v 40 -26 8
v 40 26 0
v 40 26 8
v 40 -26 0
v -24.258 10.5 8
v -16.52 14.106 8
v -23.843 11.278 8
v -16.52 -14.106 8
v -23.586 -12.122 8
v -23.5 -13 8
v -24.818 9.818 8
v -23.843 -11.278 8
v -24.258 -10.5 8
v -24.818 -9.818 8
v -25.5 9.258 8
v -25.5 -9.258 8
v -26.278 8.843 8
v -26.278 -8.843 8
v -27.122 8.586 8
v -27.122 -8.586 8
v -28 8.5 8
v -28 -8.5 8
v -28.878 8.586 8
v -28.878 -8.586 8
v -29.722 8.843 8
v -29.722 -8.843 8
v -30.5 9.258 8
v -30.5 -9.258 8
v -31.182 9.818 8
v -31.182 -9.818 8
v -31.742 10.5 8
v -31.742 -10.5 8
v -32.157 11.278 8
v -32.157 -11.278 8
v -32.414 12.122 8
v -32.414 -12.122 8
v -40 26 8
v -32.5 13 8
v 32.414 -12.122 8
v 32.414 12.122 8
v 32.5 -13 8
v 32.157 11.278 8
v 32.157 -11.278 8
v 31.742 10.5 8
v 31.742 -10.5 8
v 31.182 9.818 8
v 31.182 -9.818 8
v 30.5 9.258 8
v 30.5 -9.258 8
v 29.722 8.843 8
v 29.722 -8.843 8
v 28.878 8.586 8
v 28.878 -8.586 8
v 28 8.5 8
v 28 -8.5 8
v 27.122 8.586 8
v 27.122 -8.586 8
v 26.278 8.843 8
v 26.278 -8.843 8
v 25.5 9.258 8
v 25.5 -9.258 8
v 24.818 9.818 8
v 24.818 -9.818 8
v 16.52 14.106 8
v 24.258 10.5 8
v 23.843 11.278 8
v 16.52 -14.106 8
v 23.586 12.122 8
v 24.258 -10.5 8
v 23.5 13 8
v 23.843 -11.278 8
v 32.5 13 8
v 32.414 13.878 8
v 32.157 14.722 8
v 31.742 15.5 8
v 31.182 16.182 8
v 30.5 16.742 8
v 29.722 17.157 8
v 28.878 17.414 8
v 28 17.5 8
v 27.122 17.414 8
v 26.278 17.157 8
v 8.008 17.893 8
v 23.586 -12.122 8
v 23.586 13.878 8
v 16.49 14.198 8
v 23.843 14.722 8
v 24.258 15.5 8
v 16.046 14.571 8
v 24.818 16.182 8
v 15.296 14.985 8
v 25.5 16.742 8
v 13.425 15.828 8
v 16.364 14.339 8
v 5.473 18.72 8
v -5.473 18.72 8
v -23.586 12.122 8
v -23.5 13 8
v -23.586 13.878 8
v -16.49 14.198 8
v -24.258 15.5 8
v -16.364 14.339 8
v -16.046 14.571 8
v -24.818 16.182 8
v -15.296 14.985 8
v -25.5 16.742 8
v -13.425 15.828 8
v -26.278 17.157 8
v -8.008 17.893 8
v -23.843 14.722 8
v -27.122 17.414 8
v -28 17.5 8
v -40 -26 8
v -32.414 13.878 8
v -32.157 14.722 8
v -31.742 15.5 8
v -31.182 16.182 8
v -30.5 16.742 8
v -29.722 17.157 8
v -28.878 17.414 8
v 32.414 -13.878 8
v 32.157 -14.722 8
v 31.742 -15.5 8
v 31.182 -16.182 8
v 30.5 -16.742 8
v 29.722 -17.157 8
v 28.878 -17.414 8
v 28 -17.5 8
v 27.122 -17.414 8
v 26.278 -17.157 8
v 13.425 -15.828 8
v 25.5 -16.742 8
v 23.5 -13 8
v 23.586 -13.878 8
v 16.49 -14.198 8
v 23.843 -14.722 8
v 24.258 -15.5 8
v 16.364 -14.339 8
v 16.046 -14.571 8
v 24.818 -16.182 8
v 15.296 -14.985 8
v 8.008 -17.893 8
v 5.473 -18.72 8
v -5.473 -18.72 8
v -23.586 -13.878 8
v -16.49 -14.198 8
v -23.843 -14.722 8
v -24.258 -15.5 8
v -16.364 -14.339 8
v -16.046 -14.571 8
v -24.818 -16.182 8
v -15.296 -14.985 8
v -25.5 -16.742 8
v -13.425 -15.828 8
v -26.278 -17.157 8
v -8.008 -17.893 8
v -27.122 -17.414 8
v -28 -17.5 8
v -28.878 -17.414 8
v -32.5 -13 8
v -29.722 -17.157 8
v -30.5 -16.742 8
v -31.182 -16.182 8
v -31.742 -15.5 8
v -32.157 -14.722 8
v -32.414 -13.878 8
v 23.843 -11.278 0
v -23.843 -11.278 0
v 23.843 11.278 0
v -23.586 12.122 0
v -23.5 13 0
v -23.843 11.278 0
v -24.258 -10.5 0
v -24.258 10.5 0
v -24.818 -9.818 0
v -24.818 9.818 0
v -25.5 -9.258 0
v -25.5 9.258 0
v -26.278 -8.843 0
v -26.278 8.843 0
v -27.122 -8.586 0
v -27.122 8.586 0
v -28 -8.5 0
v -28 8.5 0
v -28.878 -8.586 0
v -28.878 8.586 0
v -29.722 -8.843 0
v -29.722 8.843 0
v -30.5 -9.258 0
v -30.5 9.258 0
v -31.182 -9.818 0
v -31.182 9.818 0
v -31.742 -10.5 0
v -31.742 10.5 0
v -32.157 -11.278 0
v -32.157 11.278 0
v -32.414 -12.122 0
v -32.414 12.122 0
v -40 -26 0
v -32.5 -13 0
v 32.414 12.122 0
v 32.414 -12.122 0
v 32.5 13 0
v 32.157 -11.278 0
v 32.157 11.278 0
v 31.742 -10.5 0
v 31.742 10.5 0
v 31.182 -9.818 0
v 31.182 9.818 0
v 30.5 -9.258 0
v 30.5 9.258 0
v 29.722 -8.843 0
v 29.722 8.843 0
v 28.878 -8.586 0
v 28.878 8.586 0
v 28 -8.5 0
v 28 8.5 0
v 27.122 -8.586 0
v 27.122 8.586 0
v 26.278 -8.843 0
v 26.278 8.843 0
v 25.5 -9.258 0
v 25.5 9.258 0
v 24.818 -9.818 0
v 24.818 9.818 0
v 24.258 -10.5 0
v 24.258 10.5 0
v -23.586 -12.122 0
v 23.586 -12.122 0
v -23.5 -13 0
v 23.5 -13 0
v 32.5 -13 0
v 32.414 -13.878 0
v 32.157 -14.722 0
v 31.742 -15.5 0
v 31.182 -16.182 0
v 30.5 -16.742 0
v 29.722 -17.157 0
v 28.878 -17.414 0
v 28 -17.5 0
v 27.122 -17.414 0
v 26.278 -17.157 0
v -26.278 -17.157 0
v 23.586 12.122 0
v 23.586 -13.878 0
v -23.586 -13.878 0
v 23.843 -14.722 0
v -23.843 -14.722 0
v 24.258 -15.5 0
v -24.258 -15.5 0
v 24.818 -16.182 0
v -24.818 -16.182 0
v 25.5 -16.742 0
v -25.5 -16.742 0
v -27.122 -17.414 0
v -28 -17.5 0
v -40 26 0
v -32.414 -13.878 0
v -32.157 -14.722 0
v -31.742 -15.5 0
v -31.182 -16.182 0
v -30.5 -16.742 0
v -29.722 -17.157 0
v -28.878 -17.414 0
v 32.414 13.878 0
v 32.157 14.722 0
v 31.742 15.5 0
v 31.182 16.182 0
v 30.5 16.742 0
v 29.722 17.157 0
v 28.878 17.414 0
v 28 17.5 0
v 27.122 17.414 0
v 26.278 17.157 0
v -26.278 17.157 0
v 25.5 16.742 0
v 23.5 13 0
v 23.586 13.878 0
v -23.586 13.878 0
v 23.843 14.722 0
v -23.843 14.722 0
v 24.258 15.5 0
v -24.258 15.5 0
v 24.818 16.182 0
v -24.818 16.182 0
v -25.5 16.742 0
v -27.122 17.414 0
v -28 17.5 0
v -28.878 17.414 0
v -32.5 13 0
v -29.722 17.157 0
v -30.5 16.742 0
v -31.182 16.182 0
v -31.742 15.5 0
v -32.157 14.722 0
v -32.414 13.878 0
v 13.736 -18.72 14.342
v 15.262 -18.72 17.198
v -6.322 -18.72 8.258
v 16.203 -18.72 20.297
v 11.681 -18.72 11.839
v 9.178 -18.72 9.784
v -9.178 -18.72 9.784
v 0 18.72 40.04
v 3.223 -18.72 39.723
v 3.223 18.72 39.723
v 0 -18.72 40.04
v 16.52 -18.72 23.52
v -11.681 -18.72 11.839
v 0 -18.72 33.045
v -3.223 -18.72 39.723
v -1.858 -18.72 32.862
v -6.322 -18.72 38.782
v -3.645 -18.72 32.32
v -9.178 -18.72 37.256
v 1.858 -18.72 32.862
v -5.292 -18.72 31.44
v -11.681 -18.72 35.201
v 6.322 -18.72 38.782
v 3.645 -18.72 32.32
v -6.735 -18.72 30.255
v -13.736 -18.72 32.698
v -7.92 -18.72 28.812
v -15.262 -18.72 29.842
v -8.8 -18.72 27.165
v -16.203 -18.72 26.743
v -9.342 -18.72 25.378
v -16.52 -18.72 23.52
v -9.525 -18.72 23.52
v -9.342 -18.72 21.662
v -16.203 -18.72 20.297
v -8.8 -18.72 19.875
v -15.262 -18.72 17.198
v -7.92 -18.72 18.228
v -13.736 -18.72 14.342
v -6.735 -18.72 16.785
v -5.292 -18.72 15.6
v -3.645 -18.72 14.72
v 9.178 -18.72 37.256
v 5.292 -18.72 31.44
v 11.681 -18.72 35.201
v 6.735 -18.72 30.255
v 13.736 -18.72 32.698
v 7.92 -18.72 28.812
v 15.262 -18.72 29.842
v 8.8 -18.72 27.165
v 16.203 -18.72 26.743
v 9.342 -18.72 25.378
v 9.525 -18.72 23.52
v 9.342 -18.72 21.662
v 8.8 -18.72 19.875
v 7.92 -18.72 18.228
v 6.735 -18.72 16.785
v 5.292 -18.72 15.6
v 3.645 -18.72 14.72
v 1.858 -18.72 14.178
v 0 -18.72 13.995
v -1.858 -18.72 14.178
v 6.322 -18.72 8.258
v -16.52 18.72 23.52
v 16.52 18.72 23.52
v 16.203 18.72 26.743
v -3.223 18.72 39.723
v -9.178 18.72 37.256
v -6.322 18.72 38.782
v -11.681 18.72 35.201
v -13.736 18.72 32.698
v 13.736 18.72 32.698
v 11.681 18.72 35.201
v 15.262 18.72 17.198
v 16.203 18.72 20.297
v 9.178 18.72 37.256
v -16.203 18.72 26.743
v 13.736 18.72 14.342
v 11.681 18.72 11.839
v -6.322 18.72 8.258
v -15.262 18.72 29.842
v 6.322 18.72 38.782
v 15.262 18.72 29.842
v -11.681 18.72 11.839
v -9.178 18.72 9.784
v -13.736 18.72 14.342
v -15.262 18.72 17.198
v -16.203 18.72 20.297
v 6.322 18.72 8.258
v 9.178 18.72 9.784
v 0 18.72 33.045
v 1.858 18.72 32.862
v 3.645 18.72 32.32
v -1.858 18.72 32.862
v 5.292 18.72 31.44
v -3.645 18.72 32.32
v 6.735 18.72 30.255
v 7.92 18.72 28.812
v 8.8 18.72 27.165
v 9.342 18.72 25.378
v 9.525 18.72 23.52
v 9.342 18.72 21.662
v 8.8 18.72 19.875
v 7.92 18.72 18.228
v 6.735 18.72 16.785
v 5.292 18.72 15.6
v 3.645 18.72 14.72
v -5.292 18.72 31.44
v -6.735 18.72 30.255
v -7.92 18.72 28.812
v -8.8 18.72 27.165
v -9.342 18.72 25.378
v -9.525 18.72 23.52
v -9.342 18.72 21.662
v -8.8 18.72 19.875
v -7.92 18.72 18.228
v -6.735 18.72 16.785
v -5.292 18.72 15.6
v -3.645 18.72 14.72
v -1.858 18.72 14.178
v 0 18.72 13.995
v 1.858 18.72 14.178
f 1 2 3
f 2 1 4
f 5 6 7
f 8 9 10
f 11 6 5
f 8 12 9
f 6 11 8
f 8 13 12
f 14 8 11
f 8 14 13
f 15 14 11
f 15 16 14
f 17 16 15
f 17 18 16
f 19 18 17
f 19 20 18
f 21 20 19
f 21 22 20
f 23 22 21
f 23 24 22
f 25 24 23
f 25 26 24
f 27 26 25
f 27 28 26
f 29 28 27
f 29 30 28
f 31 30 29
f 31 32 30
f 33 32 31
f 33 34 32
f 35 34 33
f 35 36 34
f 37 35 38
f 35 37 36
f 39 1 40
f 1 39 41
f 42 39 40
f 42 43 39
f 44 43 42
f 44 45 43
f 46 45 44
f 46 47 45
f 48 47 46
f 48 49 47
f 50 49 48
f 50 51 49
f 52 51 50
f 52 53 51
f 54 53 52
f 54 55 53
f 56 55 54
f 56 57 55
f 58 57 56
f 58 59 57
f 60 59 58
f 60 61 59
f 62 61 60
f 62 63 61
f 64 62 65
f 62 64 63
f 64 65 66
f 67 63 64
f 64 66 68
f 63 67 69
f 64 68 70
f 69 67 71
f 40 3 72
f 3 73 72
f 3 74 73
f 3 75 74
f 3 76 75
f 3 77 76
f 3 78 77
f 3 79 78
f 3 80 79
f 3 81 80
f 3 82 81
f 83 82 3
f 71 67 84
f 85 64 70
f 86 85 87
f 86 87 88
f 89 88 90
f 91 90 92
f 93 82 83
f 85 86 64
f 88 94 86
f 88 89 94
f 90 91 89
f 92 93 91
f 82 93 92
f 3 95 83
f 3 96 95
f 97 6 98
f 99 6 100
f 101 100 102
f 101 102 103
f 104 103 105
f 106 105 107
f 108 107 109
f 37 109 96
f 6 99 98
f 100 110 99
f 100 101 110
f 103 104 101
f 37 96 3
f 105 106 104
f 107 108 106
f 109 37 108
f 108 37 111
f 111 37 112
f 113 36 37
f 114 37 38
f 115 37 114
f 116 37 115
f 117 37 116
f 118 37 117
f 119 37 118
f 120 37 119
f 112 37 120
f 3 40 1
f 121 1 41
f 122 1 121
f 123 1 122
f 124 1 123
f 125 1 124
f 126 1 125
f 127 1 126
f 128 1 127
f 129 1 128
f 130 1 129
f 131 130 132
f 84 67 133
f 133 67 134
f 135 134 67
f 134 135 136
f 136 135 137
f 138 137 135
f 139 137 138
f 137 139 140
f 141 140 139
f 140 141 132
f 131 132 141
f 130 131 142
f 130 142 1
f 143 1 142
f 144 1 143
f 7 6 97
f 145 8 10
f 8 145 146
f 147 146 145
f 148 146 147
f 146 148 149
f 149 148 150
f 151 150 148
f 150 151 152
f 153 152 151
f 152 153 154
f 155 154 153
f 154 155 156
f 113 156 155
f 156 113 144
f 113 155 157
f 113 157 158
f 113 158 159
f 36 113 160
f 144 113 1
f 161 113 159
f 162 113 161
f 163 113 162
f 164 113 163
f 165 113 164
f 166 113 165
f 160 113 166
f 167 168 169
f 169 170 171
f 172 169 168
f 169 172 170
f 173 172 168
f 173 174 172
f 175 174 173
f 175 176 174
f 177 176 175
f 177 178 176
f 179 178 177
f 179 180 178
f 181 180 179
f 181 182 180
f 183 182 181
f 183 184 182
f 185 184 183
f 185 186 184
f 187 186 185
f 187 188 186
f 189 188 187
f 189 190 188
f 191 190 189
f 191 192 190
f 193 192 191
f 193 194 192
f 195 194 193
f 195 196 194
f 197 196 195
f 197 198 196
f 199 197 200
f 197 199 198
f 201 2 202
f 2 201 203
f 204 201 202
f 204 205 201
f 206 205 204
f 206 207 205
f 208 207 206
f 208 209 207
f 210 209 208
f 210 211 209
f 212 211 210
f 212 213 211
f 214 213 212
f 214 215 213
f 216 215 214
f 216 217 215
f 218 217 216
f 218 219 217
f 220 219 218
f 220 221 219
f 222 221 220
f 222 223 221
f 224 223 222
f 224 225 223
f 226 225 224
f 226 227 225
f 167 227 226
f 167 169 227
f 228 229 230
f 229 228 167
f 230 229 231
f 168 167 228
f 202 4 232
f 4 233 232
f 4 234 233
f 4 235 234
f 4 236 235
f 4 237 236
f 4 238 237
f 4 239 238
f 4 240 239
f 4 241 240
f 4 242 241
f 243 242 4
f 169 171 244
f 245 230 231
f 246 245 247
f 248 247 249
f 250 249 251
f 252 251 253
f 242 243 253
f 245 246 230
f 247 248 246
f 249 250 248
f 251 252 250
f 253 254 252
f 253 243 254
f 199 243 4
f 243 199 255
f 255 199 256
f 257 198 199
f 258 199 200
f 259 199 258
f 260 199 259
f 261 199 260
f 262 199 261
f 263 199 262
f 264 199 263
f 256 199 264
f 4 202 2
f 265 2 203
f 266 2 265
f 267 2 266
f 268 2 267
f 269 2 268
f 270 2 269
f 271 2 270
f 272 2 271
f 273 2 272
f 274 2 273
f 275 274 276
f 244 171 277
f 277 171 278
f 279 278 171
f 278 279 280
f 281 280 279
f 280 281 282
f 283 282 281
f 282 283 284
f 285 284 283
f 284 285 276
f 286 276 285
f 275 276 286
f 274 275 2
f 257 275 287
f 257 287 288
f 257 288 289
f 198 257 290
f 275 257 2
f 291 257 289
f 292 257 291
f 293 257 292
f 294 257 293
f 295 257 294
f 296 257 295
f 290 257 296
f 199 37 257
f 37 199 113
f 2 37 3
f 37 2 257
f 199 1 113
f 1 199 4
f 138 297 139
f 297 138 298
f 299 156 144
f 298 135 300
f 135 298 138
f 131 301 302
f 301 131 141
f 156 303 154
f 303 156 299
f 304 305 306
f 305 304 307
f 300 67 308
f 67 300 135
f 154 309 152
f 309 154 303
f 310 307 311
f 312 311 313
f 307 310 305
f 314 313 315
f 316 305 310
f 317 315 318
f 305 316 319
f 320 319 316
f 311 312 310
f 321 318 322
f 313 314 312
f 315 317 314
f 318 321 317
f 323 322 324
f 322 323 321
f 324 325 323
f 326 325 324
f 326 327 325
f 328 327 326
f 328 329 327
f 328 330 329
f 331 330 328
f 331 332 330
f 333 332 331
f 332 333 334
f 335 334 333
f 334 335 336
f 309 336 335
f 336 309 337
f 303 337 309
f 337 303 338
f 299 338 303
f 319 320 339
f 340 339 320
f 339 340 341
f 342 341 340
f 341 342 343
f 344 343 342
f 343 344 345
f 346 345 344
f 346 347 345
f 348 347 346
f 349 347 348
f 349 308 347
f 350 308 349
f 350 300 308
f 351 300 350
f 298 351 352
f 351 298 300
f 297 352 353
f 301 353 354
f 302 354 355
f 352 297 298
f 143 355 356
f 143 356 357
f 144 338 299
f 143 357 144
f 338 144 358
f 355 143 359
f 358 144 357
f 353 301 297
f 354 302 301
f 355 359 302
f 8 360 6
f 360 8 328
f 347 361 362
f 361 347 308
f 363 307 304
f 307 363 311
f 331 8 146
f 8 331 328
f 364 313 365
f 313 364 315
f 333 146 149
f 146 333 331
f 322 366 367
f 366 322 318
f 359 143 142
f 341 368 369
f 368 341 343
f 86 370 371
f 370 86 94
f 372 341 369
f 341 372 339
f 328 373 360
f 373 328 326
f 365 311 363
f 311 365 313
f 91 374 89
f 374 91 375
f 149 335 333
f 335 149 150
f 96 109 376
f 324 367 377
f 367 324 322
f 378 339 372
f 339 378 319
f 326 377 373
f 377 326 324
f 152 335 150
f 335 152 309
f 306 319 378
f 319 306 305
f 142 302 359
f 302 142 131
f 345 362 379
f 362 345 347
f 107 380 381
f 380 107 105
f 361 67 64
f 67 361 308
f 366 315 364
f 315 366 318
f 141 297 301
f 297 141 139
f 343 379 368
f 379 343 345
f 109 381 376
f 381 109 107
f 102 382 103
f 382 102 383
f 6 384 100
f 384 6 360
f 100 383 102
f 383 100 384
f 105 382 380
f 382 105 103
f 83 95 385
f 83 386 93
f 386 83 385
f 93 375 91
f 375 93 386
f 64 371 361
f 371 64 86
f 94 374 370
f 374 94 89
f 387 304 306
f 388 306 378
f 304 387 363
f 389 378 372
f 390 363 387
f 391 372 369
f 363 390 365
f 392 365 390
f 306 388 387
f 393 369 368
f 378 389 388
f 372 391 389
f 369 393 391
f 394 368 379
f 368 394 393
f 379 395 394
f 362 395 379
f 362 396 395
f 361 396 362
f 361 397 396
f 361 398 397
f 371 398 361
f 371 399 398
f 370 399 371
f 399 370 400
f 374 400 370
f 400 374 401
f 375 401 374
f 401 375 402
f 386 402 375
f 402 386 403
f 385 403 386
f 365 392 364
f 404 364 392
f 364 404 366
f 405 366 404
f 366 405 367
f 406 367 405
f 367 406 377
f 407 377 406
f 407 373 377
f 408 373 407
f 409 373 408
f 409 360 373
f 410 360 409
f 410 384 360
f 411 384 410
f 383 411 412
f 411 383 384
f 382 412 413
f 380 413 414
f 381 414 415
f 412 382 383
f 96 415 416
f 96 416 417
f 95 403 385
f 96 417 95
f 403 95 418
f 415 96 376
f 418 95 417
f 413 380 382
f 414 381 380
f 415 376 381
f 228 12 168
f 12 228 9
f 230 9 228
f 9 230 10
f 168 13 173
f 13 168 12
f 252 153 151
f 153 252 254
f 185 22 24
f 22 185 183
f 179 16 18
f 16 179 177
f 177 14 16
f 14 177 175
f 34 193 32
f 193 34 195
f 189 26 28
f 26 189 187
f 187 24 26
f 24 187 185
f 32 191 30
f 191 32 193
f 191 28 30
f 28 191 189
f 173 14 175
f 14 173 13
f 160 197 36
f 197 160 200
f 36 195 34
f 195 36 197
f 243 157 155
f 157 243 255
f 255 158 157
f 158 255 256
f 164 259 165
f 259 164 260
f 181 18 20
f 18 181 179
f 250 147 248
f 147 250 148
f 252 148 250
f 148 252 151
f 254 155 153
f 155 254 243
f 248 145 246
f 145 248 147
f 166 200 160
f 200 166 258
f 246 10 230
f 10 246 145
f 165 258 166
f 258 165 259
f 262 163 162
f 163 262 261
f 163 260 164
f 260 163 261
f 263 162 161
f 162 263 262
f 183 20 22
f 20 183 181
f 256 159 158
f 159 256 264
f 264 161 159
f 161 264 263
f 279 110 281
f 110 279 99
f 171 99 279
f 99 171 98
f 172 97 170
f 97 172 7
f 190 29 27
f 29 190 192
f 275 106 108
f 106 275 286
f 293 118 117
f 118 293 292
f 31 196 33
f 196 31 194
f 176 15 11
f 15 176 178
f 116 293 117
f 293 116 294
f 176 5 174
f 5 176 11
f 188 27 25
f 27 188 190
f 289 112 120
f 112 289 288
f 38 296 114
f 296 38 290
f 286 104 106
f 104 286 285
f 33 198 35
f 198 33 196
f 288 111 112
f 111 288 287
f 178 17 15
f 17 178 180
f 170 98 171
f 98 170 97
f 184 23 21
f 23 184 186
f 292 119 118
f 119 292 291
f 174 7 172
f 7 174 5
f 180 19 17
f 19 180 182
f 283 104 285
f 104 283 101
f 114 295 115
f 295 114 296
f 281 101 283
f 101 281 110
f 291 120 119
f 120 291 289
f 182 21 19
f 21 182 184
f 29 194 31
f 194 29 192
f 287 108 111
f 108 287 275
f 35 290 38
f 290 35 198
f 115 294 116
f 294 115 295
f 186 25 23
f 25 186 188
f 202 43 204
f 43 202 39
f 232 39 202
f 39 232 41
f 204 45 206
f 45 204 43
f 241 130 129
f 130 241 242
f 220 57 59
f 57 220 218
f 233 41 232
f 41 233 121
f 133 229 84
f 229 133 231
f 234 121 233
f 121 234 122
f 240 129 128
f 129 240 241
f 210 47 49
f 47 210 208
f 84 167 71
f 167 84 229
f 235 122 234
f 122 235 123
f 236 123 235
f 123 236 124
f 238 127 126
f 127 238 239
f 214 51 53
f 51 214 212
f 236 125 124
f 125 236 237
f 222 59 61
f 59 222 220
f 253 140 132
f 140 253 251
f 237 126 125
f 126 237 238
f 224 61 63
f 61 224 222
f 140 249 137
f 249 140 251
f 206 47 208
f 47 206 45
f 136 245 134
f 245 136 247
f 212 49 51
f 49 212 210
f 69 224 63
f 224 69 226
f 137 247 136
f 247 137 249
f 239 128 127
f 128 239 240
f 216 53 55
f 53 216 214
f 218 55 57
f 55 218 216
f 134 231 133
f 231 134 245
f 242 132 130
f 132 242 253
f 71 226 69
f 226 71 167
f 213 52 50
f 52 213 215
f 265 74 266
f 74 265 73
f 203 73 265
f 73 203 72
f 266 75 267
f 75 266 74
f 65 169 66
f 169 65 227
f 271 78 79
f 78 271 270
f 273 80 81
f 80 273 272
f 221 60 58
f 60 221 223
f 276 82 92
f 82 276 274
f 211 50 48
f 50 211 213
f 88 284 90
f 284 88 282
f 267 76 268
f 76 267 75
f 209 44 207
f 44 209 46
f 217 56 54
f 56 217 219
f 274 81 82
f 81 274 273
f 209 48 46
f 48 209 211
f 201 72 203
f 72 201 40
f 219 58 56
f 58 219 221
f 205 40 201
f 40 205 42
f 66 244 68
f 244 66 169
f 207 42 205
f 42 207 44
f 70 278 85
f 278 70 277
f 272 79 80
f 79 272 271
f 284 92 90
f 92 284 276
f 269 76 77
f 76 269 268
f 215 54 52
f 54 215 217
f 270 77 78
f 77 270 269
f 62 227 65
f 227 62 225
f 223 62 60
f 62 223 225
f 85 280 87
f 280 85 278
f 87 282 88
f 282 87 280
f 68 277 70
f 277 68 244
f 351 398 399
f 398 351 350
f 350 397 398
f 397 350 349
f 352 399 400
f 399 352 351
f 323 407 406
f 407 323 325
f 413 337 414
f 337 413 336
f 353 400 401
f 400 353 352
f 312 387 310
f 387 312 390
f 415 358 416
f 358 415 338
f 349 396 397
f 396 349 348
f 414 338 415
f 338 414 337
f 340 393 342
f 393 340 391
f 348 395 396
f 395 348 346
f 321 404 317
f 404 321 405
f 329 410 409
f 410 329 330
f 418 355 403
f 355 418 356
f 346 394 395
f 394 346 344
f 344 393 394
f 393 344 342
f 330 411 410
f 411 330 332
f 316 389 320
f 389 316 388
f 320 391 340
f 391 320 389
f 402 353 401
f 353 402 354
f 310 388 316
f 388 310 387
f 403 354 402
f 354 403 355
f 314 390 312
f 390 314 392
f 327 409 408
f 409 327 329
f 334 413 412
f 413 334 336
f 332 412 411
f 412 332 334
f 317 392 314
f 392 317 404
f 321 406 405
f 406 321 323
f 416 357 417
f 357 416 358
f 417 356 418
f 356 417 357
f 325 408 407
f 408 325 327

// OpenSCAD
$fn = 32;

// ----------------------------------------------------------------------
// Bearing block: 80 x 52 mm base, 19.05 mm bore at 23.52 mm
// ----------------------------------------------------------------------

// --- parameters (mm) ---
base_w = 80;              // base width
base_d = 52;              // base depth
base_t = 8;               // base thickness
bore_d = 19.05;           // shaft / bearing bore
house_r = 16.52;          // housing outer radius
house_len = 37.44;        // housing length along the shaft
foot_w = 33.04;           // foot width under the housing
foot_len = 27.44;         // foot length along the shaft
axis_z = 23.52;           // bore axis height above the base
holes_d = 9;              // mounting holes
hole_x = 28;              // mounting hole spacing

difference() {
  union() {
    /* base plate with its underside on z = 0 */
    translate([0, 0, base_t / 2]) cube([base_w, base_d, base_t], center = true);
    /* hull foot: a straight web blending into the round housing */
    hull() {
      translate([0, 0, base_t - 0.5]) cube([foot_w, foot_len, 1.6], center = true);
      translate([0, 0, axis_z]) rotate([-90, 0, 0]) cylinder(h = house_len, d = 2 * house_r, center = true);
    }
  }
  /* bore through the housing, 2.5 mm clear on both sides */
  translate([0, 0, axis_z]) rotate([-90, 0, 0]) cylinder(h = house_len + 5, d = bore_d, center = true);
  /* mounting holes through the base plate */
  for (hx = [-28, 28]) {
    for (hy = [-13, 13]) {
      translate([hx, hy, -2.5]) cylinder(h = base_t + 5, d = holes_d);
    }
  }
}
